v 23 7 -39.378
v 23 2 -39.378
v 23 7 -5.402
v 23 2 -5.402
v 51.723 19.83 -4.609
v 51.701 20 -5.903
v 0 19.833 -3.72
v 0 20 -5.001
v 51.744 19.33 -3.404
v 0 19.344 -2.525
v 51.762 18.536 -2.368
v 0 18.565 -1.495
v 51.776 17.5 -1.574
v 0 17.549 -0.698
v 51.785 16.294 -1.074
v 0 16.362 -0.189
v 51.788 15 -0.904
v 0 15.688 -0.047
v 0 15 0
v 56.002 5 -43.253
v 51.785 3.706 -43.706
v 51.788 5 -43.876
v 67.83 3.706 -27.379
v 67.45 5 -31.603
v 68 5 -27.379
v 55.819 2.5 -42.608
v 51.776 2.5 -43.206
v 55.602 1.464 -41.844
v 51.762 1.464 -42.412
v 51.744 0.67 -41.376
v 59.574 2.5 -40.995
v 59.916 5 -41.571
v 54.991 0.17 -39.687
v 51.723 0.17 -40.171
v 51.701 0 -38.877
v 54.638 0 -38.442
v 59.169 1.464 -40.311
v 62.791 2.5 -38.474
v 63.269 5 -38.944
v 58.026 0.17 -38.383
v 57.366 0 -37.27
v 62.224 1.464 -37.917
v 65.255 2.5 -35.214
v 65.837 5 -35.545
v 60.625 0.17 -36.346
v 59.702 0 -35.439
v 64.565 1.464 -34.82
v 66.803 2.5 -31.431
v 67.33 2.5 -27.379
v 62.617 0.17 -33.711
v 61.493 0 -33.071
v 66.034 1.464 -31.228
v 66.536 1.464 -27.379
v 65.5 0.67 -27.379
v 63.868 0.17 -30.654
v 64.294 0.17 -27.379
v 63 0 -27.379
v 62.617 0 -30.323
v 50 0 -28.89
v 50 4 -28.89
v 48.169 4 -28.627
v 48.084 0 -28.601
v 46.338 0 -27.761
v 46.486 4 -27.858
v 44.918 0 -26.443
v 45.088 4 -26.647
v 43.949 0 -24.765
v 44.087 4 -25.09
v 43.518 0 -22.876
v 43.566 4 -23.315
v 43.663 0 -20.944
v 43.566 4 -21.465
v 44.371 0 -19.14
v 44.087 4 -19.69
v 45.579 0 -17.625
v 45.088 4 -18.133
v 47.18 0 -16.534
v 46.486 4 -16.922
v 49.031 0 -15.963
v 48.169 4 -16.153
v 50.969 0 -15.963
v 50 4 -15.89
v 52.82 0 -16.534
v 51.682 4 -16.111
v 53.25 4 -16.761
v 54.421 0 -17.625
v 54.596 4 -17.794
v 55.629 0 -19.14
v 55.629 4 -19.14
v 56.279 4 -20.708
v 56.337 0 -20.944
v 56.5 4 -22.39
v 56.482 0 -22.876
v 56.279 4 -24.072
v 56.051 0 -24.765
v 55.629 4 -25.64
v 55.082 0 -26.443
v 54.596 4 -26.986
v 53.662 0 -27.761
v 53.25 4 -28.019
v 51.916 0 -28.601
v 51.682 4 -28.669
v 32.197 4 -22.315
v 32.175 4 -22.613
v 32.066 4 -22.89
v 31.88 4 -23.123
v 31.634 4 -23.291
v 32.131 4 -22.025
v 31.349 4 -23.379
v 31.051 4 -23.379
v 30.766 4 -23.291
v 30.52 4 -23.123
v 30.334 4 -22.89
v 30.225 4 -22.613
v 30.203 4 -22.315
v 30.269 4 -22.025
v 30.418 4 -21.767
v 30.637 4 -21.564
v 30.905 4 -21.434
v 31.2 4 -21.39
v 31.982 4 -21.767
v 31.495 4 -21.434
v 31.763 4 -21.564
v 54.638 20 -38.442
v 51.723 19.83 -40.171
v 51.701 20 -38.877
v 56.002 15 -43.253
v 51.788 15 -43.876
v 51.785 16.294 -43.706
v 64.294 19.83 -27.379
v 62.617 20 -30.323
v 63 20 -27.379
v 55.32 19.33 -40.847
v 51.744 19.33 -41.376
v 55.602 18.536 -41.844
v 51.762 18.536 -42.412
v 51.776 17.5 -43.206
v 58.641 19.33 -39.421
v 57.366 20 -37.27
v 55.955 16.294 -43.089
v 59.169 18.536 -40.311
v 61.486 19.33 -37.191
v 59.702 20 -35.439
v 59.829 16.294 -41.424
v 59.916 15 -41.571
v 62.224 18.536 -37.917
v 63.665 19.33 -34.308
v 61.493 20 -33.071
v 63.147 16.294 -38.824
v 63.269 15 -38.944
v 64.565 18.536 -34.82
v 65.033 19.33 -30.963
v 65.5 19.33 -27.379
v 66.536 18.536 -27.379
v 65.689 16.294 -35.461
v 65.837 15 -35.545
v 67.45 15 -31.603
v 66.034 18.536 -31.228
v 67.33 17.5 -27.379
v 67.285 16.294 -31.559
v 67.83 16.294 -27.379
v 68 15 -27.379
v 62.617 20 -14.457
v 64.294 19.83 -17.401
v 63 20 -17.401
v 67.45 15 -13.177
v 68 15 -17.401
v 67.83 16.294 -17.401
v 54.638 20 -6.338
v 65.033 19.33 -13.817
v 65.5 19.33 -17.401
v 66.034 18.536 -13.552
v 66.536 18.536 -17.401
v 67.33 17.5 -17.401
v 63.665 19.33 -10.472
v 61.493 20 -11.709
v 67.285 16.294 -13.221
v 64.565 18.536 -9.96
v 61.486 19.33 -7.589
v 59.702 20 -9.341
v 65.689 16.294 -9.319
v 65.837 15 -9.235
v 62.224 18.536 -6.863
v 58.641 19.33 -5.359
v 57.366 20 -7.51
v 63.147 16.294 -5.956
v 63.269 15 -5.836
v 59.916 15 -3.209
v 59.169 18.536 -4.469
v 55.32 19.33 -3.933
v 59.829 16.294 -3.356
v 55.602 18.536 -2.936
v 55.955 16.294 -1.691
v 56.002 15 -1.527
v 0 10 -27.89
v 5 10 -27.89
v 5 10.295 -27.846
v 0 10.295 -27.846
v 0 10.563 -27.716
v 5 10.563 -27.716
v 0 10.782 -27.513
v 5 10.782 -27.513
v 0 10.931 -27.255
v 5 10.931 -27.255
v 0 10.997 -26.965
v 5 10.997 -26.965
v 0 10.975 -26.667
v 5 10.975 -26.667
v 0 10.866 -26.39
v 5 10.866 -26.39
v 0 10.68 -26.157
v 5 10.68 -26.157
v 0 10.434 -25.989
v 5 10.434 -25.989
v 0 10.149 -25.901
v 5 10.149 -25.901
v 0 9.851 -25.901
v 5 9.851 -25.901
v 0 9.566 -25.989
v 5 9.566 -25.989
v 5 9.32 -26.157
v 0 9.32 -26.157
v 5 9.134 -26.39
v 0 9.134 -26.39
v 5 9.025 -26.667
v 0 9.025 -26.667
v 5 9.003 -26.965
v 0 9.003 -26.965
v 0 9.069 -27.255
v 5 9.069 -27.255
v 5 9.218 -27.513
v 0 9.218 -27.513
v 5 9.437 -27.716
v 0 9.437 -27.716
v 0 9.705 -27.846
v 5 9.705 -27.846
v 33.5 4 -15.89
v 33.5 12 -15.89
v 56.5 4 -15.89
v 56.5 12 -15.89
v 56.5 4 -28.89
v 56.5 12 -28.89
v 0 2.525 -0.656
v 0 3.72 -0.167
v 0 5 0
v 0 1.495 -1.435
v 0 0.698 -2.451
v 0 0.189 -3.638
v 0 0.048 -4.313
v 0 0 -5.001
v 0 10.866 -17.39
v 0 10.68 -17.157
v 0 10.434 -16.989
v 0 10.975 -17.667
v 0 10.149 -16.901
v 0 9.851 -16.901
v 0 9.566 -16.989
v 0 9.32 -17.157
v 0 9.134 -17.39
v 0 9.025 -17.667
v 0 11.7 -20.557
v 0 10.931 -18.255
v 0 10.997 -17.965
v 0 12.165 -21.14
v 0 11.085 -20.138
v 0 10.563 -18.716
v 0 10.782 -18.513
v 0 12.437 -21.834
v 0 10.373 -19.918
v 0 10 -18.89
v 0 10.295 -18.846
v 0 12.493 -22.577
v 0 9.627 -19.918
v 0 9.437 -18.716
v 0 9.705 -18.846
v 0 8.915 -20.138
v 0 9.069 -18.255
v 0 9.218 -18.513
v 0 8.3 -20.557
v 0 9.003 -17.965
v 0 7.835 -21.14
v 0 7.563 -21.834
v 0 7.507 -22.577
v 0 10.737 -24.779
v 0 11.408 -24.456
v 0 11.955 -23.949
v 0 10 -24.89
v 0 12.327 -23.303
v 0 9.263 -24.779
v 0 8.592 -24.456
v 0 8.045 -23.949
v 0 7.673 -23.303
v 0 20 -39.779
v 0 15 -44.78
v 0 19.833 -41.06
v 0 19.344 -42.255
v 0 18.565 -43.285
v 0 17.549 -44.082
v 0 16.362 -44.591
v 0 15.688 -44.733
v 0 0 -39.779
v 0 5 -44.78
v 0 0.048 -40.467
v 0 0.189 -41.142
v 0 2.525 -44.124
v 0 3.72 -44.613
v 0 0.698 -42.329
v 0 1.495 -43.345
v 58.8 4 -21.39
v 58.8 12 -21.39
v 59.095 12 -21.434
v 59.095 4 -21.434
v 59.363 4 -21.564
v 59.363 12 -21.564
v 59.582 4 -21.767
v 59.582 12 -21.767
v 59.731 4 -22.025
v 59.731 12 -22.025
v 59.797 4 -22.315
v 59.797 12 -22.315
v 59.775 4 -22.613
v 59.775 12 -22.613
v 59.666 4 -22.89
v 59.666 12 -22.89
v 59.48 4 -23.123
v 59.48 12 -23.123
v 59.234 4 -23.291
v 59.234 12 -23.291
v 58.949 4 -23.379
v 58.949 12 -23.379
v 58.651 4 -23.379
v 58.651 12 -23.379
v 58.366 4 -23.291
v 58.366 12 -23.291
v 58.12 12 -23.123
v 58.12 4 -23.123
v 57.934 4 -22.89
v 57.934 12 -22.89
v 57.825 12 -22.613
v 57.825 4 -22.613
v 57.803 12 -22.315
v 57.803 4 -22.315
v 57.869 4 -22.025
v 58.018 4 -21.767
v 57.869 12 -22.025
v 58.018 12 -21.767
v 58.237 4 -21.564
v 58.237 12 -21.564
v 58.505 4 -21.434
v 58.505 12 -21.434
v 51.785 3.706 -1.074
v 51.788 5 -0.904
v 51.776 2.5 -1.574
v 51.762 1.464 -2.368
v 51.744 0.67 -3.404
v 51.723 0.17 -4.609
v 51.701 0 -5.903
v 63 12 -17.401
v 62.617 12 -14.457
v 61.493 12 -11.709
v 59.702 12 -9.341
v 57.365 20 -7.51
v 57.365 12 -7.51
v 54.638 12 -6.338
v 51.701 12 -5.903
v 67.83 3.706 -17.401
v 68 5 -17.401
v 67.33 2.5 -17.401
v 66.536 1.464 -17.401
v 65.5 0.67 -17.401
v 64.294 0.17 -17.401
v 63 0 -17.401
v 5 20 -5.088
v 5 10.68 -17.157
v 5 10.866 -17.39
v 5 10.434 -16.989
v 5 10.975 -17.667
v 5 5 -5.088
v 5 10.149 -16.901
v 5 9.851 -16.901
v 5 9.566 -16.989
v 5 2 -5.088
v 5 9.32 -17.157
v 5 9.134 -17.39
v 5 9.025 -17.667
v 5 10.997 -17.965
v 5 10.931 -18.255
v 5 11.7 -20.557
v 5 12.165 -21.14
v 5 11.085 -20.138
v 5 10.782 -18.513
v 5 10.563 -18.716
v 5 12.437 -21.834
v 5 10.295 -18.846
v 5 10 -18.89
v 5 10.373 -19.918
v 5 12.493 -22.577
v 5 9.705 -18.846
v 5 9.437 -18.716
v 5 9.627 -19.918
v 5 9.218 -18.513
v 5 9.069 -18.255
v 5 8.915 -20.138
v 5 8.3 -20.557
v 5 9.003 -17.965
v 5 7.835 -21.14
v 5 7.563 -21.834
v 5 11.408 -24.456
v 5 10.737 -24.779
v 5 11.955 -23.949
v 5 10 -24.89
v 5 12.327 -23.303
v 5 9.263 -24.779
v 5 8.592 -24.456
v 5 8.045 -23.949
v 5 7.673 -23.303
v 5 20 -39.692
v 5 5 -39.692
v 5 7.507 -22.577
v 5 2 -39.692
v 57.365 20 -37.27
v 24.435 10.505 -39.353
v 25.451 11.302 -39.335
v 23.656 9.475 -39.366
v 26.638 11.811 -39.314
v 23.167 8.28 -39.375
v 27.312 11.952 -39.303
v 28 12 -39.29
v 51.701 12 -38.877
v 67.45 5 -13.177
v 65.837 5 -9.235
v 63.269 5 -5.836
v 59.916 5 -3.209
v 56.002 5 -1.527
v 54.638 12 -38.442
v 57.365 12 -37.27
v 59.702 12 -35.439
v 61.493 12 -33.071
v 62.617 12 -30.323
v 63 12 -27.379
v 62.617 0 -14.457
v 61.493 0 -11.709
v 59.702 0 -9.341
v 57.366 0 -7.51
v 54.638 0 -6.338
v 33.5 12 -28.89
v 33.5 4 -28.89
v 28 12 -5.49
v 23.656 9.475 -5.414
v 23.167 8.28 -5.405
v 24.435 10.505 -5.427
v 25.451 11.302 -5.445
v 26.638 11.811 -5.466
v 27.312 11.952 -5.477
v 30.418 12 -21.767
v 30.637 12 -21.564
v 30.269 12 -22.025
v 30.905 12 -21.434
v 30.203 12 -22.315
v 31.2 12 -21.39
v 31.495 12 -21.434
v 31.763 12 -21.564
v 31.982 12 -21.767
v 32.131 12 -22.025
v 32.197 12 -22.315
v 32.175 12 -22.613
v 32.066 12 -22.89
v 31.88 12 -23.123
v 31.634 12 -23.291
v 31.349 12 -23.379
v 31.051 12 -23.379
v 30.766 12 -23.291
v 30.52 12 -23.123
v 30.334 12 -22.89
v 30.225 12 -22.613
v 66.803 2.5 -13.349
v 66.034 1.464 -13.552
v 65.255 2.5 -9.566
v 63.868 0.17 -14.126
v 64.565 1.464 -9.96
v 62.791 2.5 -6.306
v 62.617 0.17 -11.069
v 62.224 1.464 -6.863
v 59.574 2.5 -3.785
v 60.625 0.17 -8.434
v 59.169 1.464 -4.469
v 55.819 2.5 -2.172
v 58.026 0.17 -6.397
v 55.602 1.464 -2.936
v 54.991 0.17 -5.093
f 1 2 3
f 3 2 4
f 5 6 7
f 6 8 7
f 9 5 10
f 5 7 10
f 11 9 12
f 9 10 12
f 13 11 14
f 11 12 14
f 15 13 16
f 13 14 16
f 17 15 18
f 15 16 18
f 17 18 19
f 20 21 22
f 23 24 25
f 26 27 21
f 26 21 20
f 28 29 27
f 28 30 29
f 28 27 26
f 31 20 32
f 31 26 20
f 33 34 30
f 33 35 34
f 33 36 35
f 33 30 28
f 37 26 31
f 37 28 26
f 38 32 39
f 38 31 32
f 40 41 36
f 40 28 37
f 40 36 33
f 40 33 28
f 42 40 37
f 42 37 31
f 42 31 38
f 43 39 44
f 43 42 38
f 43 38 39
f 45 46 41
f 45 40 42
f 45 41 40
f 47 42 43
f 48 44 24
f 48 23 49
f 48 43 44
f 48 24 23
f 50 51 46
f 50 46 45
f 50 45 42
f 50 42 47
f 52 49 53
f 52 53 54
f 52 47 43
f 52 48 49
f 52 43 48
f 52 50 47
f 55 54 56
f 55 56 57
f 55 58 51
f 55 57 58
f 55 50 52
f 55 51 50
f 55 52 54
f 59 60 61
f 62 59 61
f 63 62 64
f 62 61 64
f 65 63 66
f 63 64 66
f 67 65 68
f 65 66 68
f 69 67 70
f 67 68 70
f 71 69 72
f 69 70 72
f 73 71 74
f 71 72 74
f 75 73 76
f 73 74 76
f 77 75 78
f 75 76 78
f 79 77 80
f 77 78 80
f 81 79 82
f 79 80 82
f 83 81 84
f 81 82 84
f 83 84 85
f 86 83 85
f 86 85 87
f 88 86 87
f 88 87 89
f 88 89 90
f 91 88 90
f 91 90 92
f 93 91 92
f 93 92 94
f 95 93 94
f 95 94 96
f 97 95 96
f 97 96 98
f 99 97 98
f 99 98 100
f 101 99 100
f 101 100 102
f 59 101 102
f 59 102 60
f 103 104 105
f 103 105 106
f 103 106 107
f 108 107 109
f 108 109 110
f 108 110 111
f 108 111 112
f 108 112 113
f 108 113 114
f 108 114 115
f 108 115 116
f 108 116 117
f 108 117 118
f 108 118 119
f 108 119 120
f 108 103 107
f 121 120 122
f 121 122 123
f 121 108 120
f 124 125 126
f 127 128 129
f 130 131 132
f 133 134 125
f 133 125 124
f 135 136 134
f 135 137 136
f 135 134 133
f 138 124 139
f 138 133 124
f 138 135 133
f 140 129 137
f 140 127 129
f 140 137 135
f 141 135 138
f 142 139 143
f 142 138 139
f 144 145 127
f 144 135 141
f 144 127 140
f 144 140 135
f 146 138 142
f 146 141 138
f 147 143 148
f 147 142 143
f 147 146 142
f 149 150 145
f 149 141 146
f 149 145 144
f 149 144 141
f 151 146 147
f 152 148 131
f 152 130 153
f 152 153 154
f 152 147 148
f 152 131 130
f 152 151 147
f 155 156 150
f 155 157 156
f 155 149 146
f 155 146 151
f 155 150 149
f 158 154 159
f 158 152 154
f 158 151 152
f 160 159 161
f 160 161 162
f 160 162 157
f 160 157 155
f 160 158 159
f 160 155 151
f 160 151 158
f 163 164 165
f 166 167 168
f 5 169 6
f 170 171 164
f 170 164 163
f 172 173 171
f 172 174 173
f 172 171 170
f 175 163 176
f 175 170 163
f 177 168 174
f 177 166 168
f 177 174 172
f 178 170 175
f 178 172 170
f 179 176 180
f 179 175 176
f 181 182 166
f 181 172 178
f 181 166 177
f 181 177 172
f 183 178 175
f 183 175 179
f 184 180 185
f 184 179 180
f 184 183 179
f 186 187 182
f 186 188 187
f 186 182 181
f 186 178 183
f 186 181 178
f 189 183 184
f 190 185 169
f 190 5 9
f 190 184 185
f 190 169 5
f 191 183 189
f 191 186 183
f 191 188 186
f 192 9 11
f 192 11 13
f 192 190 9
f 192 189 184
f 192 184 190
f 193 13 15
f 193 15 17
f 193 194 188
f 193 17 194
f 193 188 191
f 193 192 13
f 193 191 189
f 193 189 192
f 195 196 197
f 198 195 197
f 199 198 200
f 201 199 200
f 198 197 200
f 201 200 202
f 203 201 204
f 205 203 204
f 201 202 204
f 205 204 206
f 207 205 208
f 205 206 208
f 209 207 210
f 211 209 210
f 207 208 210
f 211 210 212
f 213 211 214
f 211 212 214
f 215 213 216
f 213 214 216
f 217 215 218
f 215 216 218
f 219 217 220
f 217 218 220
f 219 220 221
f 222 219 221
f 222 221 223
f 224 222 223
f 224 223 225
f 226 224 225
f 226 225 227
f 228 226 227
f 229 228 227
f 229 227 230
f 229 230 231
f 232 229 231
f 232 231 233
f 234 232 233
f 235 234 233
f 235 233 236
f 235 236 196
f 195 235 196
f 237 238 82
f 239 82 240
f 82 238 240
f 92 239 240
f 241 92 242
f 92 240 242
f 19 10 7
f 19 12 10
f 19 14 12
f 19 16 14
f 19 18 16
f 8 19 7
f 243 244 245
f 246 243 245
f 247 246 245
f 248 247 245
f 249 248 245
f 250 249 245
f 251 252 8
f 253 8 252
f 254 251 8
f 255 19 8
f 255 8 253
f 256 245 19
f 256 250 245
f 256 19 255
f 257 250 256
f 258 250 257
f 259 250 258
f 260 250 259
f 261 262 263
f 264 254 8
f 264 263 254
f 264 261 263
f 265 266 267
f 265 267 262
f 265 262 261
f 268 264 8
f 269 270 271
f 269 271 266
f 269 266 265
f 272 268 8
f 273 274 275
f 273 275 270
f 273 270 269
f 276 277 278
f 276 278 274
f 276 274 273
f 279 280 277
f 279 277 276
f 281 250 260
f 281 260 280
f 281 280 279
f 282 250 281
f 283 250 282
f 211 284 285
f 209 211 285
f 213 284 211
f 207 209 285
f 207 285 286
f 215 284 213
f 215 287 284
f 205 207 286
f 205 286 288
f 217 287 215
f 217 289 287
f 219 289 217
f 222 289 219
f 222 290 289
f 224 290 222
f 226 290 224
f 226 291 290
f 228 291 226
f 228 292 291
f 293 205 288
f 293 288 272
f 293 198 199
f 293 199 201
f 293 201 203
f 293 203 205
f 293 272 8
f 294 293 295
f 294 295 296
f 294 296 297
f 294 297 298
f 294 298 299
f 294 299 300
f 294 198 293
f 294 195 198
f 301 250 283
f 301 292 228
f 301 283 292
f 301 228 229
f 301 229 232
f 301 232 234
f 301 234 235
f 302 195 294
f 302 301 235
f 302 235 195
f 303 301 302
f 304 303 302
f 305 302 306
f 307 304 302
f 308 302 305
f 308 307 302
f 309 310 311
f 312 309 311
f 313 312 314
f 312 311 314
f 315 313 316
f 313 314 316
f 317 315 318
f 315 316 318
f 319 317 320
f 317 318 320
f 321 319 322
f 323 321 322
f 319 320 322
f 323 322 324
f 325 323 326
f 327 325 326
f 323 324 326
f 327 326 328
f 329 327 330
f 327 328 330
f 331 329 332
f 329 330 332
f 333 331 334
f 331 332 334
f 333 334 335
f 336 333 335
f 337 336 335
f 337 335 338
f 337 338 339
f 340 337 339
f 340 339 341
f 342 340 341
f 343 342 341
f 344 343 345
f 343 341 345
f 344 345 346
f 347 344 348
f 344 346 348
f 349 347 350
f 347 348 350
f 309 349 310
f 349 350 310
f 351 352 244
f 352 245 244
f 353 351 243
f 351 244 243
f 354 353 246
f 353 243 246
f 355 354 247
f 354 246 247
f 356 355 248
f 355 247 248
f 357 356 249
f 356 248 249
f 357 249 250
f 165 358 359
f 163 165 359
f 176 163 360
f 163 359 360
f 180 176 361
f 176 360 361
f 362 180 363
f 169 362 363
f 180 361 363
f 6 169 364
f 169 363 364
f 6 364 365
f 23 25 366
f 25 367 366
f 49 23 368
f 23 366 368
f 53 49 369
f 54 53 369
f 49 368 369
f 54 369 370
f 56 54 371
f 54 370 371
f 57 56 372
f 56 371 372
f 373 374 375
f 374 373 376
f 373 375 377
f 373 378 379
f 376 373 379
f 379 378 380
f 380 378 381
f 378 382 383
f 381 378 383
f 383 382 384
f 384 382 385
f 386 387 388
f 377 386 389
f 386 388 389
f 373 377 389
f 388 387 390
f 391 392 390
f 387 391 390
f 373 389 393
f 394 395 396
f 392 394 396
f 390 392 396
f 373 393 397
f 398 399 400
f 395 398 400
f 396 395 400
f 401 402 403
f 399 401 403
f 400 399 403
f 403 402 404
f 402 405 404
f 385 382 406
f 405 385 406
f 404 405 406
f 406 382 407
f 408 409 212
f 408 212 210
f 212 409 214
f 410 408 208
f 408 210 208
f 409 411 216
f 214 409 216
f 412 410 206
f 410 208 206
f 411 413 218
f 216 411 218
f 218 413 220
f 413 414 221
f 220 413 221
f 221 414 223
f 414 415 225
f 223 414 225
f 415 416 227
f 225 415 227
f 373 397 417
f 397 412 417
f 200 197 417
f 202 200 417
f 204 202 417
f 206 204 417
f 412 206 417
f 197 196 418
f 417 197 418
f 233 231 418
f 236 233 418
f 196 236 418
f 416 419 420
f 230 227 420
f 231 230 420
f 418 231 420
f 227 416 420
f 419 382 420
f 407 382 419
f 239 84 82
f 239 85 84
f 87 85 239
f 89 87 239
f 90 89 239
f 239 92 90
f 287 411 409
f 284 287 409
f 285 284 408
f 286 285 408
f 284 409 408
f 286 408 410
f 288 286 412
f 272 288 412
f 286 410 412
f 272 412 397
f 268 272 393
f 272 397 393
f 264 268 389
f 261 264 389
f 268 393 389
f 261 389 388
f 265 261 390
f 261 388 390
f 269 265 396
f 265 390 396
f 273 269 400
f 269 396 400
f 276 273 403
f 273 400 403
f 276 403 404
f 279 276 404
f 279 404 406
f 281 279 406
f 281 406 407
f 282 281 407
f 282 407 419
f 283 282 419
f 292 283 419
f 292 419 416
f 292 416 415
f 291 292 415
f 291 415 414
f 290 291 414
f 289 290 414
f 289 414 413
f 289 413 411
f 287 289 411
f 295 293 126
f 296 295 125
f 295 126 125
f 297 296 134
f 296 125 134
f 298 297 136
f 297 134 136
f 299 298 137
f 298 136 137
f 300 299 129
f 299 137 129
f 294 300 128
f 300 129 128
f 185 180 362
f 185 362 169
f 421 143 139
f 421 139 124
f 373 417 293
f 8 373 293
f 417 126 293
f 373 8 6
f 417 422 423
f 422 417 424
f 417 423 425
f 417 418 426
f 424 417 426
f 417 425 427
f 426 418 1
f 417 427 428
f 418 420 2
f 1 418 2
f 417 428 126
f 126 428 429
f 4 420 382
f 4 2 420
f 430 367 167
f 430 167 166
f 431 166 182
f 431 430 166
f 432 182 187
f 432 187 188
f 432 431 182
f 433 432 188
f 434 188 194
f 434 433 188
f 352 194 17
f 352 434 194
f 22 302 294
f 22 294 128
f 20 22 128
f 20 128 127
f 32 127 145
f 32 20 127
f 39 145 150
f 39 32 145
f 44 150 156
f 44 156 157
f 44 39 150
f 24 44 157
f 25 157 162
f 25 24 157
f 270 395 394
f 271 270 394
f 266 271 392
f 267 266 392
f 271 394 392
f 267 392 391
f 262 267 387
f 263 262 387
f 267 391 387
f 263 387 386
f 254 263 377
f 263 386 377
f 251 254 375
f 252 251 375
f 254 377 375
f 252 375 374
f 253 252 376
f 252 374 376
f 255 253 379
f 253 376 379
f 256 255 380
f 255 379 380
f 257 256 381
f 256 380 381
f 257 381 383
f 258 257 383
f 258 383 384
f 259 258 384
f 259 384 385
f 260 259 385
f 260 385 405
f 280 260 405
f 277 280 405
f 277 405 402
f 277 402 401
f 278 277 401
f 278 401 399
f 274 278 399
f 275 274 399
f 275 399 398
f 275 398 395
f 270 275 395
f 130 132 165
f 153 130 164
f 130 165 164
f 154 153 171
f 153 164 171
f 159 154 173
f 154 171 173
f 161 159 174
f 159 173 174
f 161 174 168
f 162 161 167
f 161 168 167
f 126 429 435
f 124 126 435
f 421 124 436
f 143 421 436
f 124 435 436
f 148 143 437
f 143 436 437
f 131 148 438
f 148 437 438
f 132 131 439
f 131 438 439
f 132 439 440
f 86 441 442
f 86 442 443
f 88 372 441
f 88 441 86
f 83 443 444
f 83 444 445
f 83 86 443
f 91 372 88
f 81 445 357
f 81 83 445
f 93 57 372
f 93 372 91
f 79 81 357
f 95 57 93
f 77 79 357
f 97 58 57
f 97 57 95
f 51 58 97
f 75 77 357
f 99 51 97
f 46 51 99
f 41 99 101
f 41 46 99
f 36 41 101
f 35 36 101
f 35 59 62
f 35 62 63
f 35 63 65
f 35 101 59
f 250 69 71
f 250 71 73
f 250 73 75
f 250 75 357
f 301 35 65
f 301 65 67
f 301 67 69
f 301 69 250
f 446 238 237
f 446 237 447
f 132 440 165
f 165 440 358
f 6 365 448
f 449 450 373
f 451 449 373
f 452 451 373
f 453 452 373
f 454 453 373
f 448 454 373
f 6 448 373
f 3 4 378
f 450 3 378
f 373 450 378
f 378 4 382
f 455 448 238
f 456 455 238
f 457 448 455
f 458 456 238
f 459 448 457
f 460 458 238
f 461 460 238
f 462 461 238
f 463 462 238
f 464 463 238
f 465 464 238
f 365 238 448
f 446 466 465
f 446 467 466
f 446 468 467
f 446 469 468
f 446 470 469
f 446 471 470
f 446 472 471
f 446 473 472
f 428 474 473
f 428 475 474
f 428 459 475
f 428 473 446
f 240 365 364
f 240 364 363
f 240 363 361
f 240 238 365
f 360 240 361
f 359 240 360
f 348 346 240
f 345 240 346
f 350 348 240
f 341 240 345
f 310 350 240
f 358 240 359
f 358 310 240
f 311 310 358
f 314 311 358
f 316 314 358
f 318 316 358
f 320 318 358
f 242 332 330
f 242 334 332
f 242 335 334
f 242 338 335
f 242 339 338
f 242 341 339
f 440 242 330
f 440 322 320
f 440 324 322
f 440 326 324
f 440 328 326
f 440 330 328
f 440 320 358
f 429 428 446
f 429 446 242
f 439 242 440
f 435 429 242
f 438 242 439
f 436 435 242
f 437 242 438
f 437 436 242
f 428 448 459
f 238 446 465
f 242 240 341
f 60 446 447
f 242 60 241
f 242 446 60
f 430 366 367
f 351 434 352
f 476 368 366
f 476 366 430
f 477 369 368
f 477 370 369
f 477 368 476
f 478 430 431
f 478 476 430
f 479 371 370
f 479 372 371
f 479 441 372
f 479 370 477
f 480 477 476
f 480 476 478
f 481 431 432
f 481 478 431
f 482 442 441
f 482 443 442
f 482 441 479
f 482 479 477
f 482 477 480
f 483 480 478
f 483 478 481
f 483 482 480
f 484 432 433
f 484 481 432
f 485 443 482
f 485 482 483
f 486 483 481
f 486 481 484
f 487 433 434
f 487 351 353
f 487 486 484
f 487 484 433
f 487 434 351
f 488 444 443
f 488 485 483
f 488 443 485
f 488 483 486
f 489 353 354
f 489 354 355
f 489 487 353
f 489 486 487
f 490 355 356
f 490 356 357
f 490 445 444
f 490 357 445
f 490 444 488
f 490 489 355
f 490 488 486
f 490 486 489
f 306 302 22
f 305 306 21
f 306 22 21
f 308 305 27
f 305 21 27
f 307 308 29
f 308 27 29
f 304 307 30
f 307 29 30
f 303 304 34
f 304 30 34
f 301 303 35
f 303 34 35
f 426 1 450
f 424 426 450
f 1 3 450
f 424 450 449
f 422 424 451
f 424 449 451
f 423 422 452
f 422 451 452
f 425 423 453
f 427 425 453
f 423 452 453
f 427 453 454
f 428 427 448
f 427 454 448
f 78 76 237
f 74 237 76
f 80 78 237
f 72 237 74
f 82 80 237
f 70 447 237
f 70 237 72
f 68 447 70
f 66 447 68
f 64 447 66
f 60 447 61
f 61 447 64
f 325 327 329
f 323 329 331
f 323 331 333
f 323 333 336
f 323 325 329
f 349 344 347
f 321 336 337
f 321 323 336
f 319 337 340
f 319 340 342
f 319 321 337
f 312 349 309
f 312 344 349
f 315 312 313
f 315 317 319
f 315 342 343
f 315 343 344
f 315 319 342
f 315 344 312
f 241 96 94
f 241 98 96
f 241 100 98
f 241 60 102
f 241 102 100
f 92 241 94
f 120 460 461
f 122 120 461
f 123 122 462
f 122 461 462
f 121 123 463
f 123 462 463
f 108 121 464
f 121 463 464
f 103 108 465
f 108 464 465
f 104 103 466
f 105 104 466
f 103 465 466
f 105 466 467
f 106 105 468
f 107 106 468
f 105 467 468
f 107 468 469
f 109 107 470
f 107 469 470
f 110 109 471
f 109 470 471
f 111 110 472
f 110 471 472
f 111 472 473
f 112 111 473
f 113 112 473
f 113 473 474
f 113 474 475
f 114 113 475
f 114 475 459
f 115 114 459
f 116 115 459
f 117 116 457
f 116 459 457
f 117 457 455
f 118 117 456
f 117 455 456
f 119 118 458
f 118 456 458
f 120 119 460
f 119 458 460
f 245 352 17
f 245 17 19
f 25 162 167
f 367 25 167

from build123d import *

# Parameters (mm, degrees)
BOSS_EXTRUDE1_DEPTH      = 20
SHELL1_T                 = -5
SHELL1_THICKNESS_2_DEPTH = 3
BOSS_EXTRUDE2_DEPTH      = 10
SKETCH7_W                = 23
SKETCH7_H                = 13
CUT_EXTRUDE1_DEPTH       = 8
SKETCH8_R                = 6.5
CUT_EXTRUDE2_DEPTH       = 8
SKETCH9_R                = 1
CUT_EXTRUDE3_DEPTH       = 8
SKETCH10_R               = 2.5
SKETCH10_R_2             = 1
CUT_EXTRUDE4_DEPTH       = 8
FILLET1_R                = 5


with BuildPart() as part:
    # Sketch2 → Boss-Extrude1 (new body)
    with BuildSketch(Plane(origin=(0, 0, 0), x_dir=(1, 0, 0), z_dir=(0, 1, 0))):
        with BuildLine():
            Line((0, 0), (0, 44.78))
            Line((0, 44.78), (51.787964706, 43.876037714))
            ThreePointArc((51.787964706, 43.876037714), (63.268632411, 38.943553604), (68, 27.378550743))
            Line((68, 27.378550743), (68, 17.401449257))
            ThreePointArc((68, 17.401449257), (63.268632411, 5.836446396), (51.787964706, 0.903962286))
            Line((51.787964706, 0.903962286), (0, 0))
        make_face()
    extrude(amount=BOSS_EXTRUDE1_DEPTH)

    # Shell1
    shell1_openings = [part.faces().sort_by_distance(p)[0] for p in [
        (32.484056968, 20, -22.39),
    ]]
    offset(amount=SHELL1_T, openings=shell1_openings, kind=Kind.INTERSECTION)

    # Shell1 thickness 2 face (on inner face of the shell) → Shell1 thickness 2 (cut)
    with BuildSketch(Plane(origin=(32.938254764, 5, -22.39), x_dir=(0, 0, -1), z_dir=(0, -1, 0))):
        with BuildLine():
            Line((-17.301963035, -27.938254764), (-16.486799238, 18.76244791))
            ThreePointArc((-16.486799238, 18.76244791), (-13.049007283, 26.764125401), (-4.988550743, 30.061745236))
            Line((-4.988550743, 30.061745236), (4.988550743, 30.061745236))
            ThreePointArc((4.988550743, 30.061745236), (13.049007283, 26.764125401), (16.486799238, 18.76244791))
            Line((16.486799238, 18.76244791), (17.301963035, -27.938254764))
            Line((17.301963035, -27.938254764), (-17.301963035, -27.938254764))
        make_face()
    extrude(amount=SHELL1_THICKNESS_2_DEPTH, mode=Mode.SUBTRACT)

    # Sketch6 → Boss-Extrude2 (add)
    with BuildSketch(Plane(origin=(0, 2, 0), x_dir=(1, 0, 0), z_dir=(0, 1, 0))):
        with BuildLine():
            Line((23, 39.377771866), (23, 5.402228134))
            Line((23, 5.402228134), (51.700702674, 5.903200762))
            ThreePointArc((51.700702674, 5.903200762), (59.702380165, 9.340992717), (63, 17.401449257))
            Line((63, 17.401449257), (63, 27.378550743))
            ThreePointArc((63, 27.378550743), (59.702380165, 35.439007283), (51.700702674, 38.876799238))
            Line((51.700702674, 38.876799238), (23, 39.377771866))
        make_face()
    extrude(amount=BOSS_EXTRUDE2_DEPTH)

    # Sketch7 → Cut-Extrude1 (cut)
    with BuildSketch(Plane(origin=(0, 12, 0), x_dir=(1, 0, 0), z_dir=(0, 1, 0))):
        with Locations((45, 22.39)):
            Rectangle(SKETCH7_W, SKETCH7_H)
    extrude(amount=-CUT_EXTRUDE1_DEPTH, mode=Mode.SUBTRACT)

    # Sketch8 → Cut-Extrude2 (cut)
    with BuildSketch(Plane(origin=(0, 4, 0), x_dir=(1, 0, 0), z_dir=(0, 1, 0))):
        with Locations(Location((50, 22.39, 0), (0, 0, 90))):
            Circle(SKETCH8_R)
    extrude(amount=-CUT_EXTRUDE2_DEPTH, mode=Mode.SUBTRACT)

    # Sketch9 → Cut-Extrude3 (cut)
    with BuildSketch(Plane(origin=(0, 12, 0), x_dir=(1, 0, 0), z_dir=(0, 1, 0))):
        with Locations(Location((31.2, 22.39, 0), (0, 0, 270))):
            Circle(SKETCH9_R)
        with Locations(Location((58.8, 22.39, 0), (0, 0, 270))):
            Circle(SKETCH9_R)
    extrude(amount=-CUT_EXTRUDE3_DEPTH, mode=Mode.SUBTRACT)

    # Sketch10 → Cut-Extrude4 (cut)
    with BuildSketch(Plane(origin=(5, 0, 0), x_dir=(0, 0, -1), z_dir=(1, 0, 0))):
        with Locations((22.39, 10)):
            Circle(SKETCH10_R)
        with Locations((17.89, 10)):
            Circle(SKETCH10_R_2)
        with Locations((26.89, 10)):
            Circle(SKETCH10_R_2)
    extrude(amount=-CUT_EXTRUDE4_DEPTH, mode=Mode.SUBTRACT)

    # Fillet1
    fillet1_edges = [part.edges().sort_by_distance(p)[0] for p in [
        (68, 20, -22.39),
        (63.268632411, 20, -38.943553604),
        (25.893982353, 20, -44.328018857),
        (23, 12, -22.39),
        (25.893982353, 20, -0.451981143),
        (25.893982353, 0, -44.328018857),
        (63.268632411, 0, -38.943553604),
        (68, 0, -22.39),
        (63.268632411, 0, -5.836446396),
        (25.893982353, 0, -0.451981143),
        (63.268632411, 20, -5.836446396),
    ]]
    fillet(fillet1_edges, radius=FILLET1_R - 0.0001)  # a hair under: the kernel refuses the full size


solid = part.part
